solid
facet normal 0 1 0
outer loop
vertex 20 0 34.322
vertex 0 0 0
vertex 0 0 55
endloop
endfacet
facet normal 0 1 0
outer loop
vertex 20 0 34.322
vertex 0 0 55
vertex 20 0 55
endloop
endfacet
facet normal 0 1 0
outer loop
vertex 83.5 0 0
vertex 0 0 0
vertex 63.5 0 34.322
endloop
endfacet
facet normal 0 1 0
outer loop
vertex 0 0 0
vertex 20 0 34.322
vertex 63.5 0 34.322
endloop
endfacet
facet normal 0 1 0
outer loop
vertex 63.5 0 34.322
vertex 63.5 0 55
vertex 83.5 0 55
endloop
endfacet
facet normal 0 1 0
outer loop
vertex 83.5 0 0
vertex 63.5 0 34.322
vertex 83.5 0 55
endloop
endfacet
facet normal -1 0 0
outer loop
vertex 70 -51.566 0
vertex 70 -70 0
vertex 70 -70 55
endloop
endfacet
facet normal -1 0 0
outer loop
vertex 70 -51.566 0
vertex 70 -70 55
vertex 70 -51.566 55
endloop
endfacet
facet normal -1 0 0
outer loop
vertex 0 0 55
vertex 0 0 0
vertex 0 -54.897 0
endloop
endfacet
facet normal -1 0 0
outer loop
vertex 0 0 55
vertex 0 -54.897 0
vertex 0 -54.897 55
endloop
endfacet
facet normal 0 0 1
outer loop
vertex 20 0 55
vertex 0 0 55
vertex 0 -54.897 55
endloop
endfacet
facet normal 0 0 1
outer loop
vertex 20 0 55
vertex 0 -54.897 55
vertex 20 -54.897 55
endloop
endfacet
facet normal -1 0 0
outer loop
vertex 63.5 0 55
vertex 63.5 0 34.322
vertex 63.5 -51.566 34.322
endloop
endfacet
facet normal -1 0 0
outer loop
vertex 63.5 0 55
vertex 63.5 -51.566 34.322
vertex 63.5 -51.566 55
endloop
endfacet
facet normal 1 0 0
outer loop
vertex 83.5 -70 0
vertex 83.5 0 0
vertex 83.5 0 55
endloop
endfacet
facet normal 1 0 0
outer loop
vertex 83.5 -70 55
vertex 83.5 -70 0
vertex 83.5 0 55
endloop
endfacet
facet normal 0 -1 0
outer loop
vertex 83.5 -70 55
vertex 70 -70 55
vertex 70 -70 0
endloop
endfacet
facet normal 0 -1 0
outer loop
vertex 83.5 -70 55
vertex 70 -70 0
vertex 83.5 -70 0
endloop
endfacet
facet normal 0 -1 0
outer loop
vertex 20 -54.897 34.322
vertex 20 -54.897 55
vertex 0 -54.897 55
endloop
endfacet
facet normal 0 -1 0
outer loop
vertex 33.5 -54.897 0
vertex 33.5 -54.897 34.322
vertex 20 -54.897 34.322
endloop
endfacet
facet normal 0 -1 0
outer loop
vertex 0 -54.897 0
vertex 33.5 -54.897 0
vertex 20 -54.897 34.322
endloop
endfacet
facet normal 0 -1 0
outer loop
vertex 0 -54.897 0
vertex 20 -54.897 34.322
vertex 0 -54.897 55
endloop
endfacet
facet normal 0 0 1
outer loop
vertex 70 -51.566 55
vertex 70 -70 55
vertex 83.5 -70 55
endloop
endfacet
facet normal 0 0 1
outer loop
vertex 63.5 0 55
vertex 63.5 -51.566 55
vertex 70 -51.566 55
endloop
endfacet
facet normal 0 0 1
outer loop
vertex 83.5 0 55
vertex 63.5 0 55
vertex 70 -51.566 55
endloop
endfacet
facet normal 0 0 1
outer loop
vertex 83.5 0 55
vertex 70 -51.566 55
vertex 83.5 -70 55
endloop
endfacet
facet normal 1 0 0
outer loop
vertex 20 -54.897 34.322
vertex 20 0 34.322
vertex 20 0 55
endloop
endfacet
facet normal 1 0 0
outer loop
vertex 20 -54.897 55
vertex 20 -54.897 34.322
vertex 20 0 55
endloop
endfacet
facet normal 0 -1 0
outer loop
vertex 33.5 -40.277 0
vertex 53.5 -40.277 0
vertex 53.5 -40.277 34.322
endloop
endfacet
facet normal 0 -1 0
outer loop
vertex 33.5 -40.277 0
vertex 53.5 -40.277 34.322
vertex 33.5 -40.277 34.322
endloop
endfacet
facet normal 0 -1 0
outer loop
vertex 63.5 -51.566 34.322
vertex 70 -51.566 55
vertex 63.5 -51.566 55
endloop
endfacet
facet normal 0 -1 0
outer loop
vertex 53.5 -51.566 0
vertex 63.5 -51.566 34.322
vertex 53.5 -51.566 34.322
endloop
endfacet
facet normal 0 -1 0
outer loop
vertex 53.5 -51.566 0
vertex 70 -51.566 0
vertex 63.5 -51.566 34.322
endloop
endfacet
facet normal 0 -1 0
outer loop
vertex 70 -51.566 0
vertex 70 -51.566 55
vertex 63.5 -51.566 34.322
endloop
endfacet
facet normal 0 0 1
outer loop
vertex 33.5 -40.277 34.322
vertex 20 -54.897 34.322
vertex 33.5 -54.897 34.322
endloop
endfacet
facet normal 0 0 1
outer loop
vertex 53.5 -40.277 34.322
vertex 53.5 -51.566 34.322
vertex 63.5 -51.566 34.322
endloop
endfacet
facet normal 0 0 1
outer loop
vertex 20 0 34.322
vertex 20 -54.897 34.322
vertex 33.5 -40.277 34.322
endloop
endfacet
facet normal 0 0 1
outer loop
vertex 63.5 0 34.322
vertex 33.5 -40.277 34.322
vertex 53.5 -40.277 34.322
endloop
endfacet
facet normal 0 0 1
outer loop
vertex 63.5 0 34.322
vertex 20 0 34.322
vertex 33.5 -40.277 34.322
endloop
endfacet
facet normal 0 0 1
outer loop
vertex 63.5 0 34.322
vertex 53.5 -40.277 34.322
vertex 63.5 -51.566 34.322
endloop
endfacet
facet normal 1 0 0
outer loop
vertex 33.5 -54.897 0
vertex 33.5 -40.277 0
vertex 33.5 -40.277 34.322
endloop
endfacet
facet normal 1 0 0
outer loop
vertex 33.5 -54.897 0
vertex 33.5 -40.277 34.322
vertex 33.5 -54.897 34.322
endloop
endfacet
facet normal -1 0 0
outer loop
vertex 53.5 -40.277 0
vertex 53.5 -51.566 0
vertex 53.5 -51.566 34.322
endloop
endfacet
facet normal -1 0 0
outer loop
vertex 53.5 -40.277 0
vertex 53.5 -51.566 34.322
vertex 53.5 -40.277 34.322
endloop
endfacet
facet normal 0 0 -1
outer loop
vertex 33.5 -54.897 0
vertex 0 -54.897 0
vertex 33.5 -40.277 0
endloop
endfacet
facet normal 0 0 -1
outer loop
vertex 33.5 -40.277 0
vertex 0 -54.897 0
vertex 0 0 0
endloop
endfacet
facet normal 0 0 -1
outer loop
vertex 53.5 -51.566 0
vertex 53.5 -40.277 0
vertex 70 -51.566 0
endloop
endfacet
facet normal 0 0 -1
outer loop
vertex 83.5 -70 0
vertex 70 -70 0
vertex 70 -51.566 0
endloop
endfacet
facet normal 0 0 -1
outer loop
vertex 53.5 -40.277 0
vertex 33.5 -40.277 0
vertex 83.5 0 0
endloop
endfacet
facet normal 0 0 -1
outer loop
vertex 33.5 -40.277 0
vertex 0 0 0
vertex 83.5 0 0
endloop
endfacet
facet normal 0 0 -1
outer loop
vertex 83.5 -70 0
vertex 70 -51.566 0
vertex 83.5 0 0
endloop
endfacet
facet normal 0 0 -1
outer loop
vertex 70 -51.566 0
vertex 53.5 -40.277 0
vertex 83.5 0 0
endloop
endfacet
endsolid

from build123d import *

# Parameters (mm, degrees)
F0_W     = 83.5
F0_H     = 55
F1_DEPTH = 70
F2_W     = 43.5
F2_H     = 20.677742
F3_DEPTH = 70.001
F5_DEPTH = 55.001


with BuildPart() as f1:
    # F0 (on Front) → F1 (new body)
    with BuildSketch(Plane.XZ):
        with Locations((41.75, 27.5)):
            Rectangle(F0_W, F0_H)
    extrude(amount=F1_DEPTH)

    # F2 (on Front) → F3 (cut, through all)
    with BuildSketch(Plane.XZ):
        with Locations((41.75, 44.661129)):
            Rectangle(F2_W, F2_H)
    extrude(amount=F3_DEPTH, mode=Mode.SUBTRACT)

    # F4 (on Top) → F5 (cut, through all)
    with BuildSketch(Plane.XY):
        Polygon((33.5, -54.897401), (0, -54.897401), (0, -70), (70, -70), (70, -51.566027), (53.5, -51.566027), (53.5, -40.276553), (33.5, -40.276553), align=None)
    extrude(amount=F5_DEPTH, mode=Mode.SUBTRACT)


solid = f1.part
